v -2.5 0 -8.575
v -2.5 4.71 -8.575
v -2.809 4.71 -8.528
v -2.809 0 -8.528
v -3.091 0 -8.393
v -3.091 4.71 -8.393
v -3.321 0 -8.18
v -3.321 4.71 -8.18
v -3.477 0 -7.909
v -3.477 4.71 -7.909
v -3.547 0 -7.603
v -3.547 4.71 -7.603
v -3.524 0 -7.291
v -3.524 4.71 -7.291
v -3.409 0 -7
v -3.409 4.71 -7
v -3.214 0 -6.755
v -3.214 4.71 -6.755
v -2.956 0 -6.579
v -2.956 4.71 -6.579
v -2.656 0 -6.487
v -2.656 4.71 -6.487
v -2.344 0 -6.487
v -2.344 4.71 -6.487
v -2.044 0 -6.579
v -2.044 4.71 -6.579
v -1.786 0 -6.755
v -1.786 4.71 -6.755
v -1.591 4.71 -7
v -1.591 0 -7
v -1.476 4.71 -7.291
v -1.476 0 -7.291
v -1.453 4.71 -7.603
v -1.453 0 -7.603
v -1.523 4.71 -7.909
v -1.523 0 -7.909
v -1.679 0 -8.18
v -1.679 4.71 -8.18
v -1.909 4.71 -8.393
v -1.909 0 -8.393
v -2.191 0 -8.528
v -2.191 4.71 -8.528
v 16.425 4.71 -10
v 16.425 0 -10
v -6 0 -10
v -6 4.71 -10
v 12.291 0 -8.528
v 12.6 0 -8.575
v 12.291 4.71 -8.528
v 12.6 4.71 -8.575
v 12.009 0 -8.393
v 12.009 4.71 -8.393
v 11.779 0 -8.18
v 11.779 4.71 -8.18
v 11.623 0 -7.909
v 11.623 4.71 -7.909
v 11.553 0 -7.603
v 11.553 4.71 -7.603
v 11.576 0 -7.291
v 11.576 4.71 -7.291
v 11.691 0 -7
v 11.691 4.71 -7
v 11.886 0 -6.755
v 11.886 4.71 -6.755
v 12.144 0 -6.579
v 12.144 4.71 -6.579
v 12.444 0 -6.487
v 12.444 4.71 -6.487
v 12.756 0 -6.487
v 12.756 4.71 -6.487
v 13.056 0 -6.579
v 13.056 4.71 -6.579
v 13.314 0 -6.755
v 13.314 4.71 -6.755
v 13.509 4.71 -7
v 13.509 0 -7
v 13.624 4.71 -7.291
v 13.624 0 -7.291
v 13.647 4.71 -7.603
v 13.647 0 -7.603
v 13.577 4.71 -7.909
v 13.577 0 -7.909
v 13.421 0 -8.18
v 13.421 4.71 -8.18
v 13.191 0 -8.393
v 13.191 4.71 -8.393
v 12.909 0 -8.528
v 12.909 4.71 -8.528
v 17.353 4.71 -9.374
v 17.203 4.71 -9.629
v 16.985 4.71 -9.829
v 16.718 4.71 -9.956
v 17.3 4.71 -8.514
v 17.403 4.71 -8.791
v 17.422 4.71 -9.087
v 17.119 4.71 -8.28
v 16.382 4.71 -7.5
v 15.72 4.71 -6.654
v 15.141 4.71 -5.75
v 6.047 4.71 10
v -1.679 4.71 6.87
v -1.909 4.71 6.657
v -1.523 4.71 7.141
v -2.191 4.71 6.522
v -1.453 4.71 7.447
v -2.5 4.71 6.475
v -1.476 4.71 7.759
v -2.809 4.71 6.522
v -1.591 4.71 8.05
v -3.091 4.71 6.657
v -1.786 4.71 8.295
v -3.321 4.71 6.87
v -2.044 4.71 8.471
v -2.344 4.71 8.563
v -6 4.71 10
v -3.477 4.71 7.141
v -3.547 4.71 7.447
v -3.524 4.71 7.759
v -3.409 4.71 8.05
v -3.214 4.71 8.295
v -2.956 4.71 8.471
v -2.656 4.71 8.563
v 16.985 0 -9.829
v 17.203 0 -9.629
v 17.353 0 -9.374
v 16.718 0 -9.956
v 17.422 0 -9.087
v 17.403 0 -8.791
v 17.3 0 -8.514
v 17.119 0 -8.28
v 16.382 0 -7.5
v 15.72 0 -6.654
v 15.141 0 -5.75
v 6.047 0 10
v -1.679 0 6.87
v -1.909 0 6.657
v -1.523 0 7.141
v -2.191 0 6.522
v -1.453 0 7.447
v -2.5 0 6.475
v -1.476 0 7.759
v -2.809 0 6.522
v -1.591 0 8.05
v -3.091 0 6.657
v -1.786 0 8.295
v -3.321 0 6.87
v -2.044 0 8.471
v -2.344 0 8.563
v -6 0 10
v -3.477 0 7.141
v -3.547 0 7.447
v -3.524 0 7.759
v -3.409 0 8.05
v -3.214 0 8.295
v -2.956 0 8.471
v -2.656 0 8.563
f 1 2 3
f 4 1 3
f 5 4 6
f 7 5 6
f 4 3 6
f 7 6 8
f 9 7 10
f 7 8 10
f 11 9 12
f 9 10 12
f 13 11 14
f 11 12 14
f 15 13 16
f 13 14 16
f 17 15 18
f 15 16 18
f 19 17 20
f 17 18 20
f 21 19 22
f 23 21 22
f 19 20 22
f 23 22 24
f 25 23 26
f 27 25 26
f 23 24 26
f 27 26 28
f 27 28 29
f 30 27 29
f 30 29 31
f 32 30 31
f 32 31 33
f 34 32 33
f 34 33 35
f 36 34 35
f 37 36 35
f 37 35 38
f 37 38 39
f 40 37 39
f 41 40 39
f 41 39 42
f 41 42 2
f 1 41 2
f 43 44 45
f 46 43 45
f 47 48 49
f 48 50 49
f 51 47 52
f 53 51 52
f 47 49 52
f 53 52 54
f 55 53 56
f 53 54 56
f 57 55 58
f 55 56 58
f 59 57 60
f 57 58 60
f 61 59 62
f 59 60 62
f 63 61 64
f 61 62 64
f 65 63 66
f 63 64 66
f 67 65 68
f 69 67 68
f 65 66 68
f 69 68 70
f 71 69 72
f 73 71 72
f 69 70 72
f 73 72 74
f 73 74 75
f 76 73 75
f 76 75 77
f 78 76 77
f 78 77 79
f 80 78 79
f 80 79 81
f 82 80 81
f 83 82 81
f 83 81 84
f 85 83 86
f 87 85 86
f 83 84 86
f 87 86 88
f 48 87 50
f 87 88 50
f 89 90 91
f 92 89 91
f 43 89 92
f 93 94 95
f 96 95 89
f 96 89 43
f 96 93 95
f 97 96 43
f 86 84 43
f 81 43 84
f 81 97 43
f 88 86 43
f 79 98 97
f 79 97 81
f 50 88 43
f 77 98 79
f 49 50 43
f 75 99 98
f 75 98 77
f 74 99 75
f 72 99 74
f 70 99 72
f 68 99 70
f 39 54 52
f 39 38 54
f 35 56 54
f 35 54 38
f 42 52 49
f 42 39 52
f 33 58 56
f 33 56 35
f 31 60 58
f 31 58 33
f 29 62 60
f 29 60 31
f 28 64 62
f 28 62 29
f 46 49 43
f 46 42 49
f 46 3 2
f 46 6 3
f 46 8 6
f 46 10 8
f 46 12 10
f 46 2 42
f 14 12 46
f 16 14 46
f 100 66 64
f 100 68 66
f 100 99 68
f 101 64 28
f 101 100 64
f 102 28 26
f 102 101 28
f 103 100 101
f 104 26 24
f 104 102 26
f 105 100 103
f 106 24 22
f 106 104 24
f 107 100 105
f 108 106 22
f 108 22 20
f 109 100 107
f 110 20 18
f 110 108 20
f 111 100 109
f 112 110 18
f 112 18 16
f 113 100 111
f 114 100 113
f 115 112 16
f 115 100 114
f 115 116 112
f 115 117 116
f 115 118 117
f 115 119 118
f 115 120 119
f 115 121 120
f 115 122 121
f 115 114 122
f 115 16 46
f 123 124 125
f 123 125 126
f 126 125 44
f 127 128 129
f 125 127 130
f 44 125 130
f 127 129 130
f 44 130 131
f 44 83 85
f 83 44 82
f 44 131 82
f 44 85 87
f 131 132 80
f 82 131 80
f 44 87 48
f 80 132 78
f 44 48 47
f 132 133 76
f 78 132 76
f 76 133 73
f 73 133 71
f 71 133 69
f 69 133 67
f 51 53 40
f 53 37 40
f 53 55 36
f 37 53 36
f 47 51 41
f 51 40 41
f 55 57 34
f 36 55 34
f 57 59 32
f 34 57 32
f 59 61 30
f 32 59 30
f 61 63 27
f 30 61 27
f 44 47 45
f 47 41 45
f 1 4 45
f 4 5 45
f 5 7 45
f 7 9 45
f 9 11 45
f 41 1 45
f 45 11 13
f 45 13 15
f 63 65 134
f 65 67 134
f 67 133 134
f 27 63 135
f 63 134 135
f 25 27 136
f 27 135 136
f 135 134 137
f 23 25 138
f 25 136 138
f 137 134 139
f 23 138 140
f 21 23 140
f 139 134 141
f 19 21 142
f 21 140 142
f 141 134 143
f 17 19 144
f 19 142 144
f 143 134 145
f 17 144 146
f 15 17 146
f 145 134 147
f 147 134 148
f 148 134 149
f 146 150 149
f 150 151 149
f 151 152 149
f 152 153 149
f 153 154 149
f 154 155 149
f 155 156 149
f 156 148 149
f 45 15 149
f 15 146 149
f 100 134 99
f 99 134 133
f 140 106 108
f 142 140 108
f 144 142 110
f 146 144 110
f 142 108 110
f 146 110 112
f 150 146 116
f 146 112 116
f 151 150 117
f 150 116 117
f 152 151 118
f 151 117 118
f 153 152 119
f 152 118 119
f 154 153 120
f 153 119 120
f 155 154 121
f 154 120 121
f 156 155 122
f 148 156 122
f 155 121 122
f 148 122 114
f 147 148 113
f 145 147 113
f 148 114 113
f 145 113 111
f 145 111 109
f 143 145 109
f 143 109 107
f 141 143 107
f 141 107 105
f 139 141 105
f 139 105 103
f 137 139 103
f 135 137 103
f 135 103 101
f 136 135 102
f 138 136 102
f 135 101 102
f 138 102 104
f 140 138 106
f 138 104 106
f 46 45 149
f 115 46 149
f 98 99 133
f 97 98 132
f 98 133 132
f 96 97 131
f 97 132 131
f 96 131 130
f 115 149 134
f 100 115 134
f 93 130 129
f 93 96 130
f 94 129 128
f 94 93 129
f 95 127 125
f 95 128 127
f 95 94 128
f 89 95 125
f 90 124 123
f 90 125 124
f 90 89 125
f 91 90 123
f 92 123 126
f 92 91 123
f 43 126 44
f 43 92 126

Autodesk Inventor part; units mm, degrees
ref_plane "YZ Plane" through (0, 0, 0) normal (1, 0, 0) x (0, 1, 0)
ref_plane "XZ Plane" through (0, 0, 0) normal (0, 1, 0) x (-1, 0, 0)
ref_plane "XY Plane" through (0, 0, 0) normal (0, 0, 1) x (1, 0, 0)
sketch "Sketch1" plane through (0, 0, 0) normal (0, 1, 0) x (-1, 0, 0)
  line L0 (4, 10) -> (-19.4211, 10)
  line L1 (-19.4211, -10) -> (4, -10)
  line L2 (4, -10) -> (4, 10)
  arc A0 (-19.4211, -10) -> (-19.4211, 10) centre (-25.1, 0) ccw
  line L3 (4, -10) -> (6, -10)
  line L4 (6, -10) -> (6, 10)
  line L5 (6, 10) -> (4, 10)
  line L6 (4, 10) -> (4, -10)
  point P0 (0, 0)
  dimension "d0" = 20
  dimension "d2" = 4
  dimension "d3" = 10
  dimension "d6" = 10
  dimension "d7" = 23
  dimension "d8" = 29.1
  dimension "d11" = 23.4211
  dimension "d12" = 20
  dimension "d13" = 2
extrude "Extrusion1" add sketch "Sketch1" along normal blind 4.71
fillet "Fillet1" radius 1 2 edges at (19.4211, 2.355, -10) (19.4211, 2.355, 10)
sketch "Sketch3" plane through (0, 0, 0) normal (0, -1, 0) x (1, 0, 0)
  circle A0 centre (-2.5, -7.525) radius 1.05
  circle A1 centre (12.6, -7.525) radius 1.05
  circle A2 centre (12.6, 7.525) radius 1.05
  circle A3 centre (-2.5, 7.525) radius 1.05
  point P0 (0, 0)
hole "Hole2" at (-2.5, 0, -7.525) at (-2.5, 0, 7.525) at (12.6, 0, 7.525) at (12.6, 0, -7.525) direction (0, 1, 0) diameter 2.1 end through all
sketch "Sketch4" plane through (0, 0, 0) normal (0, -1, 0) x (1, 0, 0)
  line L0 (1.4953, 17.8846) -> (19.0725, -12.5601)
  arc A0 (17.1193, 8.28) -> (17.1193, -8.28) centre (25.1, 0) ccw projected
  arc A1 (17.1193, 8.28) -> (16.4253, 10) centre (16.4253, 9) ccw projected
  line L1 (-6, 10) -> (16.4253, 10) projected
  point P0 (0, 0)
  point P1 (6.0474, 10)
  point P2 (15.1407, -5.75)
  dimension "d29" = 60
extrude "Extrusion2" cut sketch "Sketch4" against normal up to next
properties part number "3D_printed_part"
